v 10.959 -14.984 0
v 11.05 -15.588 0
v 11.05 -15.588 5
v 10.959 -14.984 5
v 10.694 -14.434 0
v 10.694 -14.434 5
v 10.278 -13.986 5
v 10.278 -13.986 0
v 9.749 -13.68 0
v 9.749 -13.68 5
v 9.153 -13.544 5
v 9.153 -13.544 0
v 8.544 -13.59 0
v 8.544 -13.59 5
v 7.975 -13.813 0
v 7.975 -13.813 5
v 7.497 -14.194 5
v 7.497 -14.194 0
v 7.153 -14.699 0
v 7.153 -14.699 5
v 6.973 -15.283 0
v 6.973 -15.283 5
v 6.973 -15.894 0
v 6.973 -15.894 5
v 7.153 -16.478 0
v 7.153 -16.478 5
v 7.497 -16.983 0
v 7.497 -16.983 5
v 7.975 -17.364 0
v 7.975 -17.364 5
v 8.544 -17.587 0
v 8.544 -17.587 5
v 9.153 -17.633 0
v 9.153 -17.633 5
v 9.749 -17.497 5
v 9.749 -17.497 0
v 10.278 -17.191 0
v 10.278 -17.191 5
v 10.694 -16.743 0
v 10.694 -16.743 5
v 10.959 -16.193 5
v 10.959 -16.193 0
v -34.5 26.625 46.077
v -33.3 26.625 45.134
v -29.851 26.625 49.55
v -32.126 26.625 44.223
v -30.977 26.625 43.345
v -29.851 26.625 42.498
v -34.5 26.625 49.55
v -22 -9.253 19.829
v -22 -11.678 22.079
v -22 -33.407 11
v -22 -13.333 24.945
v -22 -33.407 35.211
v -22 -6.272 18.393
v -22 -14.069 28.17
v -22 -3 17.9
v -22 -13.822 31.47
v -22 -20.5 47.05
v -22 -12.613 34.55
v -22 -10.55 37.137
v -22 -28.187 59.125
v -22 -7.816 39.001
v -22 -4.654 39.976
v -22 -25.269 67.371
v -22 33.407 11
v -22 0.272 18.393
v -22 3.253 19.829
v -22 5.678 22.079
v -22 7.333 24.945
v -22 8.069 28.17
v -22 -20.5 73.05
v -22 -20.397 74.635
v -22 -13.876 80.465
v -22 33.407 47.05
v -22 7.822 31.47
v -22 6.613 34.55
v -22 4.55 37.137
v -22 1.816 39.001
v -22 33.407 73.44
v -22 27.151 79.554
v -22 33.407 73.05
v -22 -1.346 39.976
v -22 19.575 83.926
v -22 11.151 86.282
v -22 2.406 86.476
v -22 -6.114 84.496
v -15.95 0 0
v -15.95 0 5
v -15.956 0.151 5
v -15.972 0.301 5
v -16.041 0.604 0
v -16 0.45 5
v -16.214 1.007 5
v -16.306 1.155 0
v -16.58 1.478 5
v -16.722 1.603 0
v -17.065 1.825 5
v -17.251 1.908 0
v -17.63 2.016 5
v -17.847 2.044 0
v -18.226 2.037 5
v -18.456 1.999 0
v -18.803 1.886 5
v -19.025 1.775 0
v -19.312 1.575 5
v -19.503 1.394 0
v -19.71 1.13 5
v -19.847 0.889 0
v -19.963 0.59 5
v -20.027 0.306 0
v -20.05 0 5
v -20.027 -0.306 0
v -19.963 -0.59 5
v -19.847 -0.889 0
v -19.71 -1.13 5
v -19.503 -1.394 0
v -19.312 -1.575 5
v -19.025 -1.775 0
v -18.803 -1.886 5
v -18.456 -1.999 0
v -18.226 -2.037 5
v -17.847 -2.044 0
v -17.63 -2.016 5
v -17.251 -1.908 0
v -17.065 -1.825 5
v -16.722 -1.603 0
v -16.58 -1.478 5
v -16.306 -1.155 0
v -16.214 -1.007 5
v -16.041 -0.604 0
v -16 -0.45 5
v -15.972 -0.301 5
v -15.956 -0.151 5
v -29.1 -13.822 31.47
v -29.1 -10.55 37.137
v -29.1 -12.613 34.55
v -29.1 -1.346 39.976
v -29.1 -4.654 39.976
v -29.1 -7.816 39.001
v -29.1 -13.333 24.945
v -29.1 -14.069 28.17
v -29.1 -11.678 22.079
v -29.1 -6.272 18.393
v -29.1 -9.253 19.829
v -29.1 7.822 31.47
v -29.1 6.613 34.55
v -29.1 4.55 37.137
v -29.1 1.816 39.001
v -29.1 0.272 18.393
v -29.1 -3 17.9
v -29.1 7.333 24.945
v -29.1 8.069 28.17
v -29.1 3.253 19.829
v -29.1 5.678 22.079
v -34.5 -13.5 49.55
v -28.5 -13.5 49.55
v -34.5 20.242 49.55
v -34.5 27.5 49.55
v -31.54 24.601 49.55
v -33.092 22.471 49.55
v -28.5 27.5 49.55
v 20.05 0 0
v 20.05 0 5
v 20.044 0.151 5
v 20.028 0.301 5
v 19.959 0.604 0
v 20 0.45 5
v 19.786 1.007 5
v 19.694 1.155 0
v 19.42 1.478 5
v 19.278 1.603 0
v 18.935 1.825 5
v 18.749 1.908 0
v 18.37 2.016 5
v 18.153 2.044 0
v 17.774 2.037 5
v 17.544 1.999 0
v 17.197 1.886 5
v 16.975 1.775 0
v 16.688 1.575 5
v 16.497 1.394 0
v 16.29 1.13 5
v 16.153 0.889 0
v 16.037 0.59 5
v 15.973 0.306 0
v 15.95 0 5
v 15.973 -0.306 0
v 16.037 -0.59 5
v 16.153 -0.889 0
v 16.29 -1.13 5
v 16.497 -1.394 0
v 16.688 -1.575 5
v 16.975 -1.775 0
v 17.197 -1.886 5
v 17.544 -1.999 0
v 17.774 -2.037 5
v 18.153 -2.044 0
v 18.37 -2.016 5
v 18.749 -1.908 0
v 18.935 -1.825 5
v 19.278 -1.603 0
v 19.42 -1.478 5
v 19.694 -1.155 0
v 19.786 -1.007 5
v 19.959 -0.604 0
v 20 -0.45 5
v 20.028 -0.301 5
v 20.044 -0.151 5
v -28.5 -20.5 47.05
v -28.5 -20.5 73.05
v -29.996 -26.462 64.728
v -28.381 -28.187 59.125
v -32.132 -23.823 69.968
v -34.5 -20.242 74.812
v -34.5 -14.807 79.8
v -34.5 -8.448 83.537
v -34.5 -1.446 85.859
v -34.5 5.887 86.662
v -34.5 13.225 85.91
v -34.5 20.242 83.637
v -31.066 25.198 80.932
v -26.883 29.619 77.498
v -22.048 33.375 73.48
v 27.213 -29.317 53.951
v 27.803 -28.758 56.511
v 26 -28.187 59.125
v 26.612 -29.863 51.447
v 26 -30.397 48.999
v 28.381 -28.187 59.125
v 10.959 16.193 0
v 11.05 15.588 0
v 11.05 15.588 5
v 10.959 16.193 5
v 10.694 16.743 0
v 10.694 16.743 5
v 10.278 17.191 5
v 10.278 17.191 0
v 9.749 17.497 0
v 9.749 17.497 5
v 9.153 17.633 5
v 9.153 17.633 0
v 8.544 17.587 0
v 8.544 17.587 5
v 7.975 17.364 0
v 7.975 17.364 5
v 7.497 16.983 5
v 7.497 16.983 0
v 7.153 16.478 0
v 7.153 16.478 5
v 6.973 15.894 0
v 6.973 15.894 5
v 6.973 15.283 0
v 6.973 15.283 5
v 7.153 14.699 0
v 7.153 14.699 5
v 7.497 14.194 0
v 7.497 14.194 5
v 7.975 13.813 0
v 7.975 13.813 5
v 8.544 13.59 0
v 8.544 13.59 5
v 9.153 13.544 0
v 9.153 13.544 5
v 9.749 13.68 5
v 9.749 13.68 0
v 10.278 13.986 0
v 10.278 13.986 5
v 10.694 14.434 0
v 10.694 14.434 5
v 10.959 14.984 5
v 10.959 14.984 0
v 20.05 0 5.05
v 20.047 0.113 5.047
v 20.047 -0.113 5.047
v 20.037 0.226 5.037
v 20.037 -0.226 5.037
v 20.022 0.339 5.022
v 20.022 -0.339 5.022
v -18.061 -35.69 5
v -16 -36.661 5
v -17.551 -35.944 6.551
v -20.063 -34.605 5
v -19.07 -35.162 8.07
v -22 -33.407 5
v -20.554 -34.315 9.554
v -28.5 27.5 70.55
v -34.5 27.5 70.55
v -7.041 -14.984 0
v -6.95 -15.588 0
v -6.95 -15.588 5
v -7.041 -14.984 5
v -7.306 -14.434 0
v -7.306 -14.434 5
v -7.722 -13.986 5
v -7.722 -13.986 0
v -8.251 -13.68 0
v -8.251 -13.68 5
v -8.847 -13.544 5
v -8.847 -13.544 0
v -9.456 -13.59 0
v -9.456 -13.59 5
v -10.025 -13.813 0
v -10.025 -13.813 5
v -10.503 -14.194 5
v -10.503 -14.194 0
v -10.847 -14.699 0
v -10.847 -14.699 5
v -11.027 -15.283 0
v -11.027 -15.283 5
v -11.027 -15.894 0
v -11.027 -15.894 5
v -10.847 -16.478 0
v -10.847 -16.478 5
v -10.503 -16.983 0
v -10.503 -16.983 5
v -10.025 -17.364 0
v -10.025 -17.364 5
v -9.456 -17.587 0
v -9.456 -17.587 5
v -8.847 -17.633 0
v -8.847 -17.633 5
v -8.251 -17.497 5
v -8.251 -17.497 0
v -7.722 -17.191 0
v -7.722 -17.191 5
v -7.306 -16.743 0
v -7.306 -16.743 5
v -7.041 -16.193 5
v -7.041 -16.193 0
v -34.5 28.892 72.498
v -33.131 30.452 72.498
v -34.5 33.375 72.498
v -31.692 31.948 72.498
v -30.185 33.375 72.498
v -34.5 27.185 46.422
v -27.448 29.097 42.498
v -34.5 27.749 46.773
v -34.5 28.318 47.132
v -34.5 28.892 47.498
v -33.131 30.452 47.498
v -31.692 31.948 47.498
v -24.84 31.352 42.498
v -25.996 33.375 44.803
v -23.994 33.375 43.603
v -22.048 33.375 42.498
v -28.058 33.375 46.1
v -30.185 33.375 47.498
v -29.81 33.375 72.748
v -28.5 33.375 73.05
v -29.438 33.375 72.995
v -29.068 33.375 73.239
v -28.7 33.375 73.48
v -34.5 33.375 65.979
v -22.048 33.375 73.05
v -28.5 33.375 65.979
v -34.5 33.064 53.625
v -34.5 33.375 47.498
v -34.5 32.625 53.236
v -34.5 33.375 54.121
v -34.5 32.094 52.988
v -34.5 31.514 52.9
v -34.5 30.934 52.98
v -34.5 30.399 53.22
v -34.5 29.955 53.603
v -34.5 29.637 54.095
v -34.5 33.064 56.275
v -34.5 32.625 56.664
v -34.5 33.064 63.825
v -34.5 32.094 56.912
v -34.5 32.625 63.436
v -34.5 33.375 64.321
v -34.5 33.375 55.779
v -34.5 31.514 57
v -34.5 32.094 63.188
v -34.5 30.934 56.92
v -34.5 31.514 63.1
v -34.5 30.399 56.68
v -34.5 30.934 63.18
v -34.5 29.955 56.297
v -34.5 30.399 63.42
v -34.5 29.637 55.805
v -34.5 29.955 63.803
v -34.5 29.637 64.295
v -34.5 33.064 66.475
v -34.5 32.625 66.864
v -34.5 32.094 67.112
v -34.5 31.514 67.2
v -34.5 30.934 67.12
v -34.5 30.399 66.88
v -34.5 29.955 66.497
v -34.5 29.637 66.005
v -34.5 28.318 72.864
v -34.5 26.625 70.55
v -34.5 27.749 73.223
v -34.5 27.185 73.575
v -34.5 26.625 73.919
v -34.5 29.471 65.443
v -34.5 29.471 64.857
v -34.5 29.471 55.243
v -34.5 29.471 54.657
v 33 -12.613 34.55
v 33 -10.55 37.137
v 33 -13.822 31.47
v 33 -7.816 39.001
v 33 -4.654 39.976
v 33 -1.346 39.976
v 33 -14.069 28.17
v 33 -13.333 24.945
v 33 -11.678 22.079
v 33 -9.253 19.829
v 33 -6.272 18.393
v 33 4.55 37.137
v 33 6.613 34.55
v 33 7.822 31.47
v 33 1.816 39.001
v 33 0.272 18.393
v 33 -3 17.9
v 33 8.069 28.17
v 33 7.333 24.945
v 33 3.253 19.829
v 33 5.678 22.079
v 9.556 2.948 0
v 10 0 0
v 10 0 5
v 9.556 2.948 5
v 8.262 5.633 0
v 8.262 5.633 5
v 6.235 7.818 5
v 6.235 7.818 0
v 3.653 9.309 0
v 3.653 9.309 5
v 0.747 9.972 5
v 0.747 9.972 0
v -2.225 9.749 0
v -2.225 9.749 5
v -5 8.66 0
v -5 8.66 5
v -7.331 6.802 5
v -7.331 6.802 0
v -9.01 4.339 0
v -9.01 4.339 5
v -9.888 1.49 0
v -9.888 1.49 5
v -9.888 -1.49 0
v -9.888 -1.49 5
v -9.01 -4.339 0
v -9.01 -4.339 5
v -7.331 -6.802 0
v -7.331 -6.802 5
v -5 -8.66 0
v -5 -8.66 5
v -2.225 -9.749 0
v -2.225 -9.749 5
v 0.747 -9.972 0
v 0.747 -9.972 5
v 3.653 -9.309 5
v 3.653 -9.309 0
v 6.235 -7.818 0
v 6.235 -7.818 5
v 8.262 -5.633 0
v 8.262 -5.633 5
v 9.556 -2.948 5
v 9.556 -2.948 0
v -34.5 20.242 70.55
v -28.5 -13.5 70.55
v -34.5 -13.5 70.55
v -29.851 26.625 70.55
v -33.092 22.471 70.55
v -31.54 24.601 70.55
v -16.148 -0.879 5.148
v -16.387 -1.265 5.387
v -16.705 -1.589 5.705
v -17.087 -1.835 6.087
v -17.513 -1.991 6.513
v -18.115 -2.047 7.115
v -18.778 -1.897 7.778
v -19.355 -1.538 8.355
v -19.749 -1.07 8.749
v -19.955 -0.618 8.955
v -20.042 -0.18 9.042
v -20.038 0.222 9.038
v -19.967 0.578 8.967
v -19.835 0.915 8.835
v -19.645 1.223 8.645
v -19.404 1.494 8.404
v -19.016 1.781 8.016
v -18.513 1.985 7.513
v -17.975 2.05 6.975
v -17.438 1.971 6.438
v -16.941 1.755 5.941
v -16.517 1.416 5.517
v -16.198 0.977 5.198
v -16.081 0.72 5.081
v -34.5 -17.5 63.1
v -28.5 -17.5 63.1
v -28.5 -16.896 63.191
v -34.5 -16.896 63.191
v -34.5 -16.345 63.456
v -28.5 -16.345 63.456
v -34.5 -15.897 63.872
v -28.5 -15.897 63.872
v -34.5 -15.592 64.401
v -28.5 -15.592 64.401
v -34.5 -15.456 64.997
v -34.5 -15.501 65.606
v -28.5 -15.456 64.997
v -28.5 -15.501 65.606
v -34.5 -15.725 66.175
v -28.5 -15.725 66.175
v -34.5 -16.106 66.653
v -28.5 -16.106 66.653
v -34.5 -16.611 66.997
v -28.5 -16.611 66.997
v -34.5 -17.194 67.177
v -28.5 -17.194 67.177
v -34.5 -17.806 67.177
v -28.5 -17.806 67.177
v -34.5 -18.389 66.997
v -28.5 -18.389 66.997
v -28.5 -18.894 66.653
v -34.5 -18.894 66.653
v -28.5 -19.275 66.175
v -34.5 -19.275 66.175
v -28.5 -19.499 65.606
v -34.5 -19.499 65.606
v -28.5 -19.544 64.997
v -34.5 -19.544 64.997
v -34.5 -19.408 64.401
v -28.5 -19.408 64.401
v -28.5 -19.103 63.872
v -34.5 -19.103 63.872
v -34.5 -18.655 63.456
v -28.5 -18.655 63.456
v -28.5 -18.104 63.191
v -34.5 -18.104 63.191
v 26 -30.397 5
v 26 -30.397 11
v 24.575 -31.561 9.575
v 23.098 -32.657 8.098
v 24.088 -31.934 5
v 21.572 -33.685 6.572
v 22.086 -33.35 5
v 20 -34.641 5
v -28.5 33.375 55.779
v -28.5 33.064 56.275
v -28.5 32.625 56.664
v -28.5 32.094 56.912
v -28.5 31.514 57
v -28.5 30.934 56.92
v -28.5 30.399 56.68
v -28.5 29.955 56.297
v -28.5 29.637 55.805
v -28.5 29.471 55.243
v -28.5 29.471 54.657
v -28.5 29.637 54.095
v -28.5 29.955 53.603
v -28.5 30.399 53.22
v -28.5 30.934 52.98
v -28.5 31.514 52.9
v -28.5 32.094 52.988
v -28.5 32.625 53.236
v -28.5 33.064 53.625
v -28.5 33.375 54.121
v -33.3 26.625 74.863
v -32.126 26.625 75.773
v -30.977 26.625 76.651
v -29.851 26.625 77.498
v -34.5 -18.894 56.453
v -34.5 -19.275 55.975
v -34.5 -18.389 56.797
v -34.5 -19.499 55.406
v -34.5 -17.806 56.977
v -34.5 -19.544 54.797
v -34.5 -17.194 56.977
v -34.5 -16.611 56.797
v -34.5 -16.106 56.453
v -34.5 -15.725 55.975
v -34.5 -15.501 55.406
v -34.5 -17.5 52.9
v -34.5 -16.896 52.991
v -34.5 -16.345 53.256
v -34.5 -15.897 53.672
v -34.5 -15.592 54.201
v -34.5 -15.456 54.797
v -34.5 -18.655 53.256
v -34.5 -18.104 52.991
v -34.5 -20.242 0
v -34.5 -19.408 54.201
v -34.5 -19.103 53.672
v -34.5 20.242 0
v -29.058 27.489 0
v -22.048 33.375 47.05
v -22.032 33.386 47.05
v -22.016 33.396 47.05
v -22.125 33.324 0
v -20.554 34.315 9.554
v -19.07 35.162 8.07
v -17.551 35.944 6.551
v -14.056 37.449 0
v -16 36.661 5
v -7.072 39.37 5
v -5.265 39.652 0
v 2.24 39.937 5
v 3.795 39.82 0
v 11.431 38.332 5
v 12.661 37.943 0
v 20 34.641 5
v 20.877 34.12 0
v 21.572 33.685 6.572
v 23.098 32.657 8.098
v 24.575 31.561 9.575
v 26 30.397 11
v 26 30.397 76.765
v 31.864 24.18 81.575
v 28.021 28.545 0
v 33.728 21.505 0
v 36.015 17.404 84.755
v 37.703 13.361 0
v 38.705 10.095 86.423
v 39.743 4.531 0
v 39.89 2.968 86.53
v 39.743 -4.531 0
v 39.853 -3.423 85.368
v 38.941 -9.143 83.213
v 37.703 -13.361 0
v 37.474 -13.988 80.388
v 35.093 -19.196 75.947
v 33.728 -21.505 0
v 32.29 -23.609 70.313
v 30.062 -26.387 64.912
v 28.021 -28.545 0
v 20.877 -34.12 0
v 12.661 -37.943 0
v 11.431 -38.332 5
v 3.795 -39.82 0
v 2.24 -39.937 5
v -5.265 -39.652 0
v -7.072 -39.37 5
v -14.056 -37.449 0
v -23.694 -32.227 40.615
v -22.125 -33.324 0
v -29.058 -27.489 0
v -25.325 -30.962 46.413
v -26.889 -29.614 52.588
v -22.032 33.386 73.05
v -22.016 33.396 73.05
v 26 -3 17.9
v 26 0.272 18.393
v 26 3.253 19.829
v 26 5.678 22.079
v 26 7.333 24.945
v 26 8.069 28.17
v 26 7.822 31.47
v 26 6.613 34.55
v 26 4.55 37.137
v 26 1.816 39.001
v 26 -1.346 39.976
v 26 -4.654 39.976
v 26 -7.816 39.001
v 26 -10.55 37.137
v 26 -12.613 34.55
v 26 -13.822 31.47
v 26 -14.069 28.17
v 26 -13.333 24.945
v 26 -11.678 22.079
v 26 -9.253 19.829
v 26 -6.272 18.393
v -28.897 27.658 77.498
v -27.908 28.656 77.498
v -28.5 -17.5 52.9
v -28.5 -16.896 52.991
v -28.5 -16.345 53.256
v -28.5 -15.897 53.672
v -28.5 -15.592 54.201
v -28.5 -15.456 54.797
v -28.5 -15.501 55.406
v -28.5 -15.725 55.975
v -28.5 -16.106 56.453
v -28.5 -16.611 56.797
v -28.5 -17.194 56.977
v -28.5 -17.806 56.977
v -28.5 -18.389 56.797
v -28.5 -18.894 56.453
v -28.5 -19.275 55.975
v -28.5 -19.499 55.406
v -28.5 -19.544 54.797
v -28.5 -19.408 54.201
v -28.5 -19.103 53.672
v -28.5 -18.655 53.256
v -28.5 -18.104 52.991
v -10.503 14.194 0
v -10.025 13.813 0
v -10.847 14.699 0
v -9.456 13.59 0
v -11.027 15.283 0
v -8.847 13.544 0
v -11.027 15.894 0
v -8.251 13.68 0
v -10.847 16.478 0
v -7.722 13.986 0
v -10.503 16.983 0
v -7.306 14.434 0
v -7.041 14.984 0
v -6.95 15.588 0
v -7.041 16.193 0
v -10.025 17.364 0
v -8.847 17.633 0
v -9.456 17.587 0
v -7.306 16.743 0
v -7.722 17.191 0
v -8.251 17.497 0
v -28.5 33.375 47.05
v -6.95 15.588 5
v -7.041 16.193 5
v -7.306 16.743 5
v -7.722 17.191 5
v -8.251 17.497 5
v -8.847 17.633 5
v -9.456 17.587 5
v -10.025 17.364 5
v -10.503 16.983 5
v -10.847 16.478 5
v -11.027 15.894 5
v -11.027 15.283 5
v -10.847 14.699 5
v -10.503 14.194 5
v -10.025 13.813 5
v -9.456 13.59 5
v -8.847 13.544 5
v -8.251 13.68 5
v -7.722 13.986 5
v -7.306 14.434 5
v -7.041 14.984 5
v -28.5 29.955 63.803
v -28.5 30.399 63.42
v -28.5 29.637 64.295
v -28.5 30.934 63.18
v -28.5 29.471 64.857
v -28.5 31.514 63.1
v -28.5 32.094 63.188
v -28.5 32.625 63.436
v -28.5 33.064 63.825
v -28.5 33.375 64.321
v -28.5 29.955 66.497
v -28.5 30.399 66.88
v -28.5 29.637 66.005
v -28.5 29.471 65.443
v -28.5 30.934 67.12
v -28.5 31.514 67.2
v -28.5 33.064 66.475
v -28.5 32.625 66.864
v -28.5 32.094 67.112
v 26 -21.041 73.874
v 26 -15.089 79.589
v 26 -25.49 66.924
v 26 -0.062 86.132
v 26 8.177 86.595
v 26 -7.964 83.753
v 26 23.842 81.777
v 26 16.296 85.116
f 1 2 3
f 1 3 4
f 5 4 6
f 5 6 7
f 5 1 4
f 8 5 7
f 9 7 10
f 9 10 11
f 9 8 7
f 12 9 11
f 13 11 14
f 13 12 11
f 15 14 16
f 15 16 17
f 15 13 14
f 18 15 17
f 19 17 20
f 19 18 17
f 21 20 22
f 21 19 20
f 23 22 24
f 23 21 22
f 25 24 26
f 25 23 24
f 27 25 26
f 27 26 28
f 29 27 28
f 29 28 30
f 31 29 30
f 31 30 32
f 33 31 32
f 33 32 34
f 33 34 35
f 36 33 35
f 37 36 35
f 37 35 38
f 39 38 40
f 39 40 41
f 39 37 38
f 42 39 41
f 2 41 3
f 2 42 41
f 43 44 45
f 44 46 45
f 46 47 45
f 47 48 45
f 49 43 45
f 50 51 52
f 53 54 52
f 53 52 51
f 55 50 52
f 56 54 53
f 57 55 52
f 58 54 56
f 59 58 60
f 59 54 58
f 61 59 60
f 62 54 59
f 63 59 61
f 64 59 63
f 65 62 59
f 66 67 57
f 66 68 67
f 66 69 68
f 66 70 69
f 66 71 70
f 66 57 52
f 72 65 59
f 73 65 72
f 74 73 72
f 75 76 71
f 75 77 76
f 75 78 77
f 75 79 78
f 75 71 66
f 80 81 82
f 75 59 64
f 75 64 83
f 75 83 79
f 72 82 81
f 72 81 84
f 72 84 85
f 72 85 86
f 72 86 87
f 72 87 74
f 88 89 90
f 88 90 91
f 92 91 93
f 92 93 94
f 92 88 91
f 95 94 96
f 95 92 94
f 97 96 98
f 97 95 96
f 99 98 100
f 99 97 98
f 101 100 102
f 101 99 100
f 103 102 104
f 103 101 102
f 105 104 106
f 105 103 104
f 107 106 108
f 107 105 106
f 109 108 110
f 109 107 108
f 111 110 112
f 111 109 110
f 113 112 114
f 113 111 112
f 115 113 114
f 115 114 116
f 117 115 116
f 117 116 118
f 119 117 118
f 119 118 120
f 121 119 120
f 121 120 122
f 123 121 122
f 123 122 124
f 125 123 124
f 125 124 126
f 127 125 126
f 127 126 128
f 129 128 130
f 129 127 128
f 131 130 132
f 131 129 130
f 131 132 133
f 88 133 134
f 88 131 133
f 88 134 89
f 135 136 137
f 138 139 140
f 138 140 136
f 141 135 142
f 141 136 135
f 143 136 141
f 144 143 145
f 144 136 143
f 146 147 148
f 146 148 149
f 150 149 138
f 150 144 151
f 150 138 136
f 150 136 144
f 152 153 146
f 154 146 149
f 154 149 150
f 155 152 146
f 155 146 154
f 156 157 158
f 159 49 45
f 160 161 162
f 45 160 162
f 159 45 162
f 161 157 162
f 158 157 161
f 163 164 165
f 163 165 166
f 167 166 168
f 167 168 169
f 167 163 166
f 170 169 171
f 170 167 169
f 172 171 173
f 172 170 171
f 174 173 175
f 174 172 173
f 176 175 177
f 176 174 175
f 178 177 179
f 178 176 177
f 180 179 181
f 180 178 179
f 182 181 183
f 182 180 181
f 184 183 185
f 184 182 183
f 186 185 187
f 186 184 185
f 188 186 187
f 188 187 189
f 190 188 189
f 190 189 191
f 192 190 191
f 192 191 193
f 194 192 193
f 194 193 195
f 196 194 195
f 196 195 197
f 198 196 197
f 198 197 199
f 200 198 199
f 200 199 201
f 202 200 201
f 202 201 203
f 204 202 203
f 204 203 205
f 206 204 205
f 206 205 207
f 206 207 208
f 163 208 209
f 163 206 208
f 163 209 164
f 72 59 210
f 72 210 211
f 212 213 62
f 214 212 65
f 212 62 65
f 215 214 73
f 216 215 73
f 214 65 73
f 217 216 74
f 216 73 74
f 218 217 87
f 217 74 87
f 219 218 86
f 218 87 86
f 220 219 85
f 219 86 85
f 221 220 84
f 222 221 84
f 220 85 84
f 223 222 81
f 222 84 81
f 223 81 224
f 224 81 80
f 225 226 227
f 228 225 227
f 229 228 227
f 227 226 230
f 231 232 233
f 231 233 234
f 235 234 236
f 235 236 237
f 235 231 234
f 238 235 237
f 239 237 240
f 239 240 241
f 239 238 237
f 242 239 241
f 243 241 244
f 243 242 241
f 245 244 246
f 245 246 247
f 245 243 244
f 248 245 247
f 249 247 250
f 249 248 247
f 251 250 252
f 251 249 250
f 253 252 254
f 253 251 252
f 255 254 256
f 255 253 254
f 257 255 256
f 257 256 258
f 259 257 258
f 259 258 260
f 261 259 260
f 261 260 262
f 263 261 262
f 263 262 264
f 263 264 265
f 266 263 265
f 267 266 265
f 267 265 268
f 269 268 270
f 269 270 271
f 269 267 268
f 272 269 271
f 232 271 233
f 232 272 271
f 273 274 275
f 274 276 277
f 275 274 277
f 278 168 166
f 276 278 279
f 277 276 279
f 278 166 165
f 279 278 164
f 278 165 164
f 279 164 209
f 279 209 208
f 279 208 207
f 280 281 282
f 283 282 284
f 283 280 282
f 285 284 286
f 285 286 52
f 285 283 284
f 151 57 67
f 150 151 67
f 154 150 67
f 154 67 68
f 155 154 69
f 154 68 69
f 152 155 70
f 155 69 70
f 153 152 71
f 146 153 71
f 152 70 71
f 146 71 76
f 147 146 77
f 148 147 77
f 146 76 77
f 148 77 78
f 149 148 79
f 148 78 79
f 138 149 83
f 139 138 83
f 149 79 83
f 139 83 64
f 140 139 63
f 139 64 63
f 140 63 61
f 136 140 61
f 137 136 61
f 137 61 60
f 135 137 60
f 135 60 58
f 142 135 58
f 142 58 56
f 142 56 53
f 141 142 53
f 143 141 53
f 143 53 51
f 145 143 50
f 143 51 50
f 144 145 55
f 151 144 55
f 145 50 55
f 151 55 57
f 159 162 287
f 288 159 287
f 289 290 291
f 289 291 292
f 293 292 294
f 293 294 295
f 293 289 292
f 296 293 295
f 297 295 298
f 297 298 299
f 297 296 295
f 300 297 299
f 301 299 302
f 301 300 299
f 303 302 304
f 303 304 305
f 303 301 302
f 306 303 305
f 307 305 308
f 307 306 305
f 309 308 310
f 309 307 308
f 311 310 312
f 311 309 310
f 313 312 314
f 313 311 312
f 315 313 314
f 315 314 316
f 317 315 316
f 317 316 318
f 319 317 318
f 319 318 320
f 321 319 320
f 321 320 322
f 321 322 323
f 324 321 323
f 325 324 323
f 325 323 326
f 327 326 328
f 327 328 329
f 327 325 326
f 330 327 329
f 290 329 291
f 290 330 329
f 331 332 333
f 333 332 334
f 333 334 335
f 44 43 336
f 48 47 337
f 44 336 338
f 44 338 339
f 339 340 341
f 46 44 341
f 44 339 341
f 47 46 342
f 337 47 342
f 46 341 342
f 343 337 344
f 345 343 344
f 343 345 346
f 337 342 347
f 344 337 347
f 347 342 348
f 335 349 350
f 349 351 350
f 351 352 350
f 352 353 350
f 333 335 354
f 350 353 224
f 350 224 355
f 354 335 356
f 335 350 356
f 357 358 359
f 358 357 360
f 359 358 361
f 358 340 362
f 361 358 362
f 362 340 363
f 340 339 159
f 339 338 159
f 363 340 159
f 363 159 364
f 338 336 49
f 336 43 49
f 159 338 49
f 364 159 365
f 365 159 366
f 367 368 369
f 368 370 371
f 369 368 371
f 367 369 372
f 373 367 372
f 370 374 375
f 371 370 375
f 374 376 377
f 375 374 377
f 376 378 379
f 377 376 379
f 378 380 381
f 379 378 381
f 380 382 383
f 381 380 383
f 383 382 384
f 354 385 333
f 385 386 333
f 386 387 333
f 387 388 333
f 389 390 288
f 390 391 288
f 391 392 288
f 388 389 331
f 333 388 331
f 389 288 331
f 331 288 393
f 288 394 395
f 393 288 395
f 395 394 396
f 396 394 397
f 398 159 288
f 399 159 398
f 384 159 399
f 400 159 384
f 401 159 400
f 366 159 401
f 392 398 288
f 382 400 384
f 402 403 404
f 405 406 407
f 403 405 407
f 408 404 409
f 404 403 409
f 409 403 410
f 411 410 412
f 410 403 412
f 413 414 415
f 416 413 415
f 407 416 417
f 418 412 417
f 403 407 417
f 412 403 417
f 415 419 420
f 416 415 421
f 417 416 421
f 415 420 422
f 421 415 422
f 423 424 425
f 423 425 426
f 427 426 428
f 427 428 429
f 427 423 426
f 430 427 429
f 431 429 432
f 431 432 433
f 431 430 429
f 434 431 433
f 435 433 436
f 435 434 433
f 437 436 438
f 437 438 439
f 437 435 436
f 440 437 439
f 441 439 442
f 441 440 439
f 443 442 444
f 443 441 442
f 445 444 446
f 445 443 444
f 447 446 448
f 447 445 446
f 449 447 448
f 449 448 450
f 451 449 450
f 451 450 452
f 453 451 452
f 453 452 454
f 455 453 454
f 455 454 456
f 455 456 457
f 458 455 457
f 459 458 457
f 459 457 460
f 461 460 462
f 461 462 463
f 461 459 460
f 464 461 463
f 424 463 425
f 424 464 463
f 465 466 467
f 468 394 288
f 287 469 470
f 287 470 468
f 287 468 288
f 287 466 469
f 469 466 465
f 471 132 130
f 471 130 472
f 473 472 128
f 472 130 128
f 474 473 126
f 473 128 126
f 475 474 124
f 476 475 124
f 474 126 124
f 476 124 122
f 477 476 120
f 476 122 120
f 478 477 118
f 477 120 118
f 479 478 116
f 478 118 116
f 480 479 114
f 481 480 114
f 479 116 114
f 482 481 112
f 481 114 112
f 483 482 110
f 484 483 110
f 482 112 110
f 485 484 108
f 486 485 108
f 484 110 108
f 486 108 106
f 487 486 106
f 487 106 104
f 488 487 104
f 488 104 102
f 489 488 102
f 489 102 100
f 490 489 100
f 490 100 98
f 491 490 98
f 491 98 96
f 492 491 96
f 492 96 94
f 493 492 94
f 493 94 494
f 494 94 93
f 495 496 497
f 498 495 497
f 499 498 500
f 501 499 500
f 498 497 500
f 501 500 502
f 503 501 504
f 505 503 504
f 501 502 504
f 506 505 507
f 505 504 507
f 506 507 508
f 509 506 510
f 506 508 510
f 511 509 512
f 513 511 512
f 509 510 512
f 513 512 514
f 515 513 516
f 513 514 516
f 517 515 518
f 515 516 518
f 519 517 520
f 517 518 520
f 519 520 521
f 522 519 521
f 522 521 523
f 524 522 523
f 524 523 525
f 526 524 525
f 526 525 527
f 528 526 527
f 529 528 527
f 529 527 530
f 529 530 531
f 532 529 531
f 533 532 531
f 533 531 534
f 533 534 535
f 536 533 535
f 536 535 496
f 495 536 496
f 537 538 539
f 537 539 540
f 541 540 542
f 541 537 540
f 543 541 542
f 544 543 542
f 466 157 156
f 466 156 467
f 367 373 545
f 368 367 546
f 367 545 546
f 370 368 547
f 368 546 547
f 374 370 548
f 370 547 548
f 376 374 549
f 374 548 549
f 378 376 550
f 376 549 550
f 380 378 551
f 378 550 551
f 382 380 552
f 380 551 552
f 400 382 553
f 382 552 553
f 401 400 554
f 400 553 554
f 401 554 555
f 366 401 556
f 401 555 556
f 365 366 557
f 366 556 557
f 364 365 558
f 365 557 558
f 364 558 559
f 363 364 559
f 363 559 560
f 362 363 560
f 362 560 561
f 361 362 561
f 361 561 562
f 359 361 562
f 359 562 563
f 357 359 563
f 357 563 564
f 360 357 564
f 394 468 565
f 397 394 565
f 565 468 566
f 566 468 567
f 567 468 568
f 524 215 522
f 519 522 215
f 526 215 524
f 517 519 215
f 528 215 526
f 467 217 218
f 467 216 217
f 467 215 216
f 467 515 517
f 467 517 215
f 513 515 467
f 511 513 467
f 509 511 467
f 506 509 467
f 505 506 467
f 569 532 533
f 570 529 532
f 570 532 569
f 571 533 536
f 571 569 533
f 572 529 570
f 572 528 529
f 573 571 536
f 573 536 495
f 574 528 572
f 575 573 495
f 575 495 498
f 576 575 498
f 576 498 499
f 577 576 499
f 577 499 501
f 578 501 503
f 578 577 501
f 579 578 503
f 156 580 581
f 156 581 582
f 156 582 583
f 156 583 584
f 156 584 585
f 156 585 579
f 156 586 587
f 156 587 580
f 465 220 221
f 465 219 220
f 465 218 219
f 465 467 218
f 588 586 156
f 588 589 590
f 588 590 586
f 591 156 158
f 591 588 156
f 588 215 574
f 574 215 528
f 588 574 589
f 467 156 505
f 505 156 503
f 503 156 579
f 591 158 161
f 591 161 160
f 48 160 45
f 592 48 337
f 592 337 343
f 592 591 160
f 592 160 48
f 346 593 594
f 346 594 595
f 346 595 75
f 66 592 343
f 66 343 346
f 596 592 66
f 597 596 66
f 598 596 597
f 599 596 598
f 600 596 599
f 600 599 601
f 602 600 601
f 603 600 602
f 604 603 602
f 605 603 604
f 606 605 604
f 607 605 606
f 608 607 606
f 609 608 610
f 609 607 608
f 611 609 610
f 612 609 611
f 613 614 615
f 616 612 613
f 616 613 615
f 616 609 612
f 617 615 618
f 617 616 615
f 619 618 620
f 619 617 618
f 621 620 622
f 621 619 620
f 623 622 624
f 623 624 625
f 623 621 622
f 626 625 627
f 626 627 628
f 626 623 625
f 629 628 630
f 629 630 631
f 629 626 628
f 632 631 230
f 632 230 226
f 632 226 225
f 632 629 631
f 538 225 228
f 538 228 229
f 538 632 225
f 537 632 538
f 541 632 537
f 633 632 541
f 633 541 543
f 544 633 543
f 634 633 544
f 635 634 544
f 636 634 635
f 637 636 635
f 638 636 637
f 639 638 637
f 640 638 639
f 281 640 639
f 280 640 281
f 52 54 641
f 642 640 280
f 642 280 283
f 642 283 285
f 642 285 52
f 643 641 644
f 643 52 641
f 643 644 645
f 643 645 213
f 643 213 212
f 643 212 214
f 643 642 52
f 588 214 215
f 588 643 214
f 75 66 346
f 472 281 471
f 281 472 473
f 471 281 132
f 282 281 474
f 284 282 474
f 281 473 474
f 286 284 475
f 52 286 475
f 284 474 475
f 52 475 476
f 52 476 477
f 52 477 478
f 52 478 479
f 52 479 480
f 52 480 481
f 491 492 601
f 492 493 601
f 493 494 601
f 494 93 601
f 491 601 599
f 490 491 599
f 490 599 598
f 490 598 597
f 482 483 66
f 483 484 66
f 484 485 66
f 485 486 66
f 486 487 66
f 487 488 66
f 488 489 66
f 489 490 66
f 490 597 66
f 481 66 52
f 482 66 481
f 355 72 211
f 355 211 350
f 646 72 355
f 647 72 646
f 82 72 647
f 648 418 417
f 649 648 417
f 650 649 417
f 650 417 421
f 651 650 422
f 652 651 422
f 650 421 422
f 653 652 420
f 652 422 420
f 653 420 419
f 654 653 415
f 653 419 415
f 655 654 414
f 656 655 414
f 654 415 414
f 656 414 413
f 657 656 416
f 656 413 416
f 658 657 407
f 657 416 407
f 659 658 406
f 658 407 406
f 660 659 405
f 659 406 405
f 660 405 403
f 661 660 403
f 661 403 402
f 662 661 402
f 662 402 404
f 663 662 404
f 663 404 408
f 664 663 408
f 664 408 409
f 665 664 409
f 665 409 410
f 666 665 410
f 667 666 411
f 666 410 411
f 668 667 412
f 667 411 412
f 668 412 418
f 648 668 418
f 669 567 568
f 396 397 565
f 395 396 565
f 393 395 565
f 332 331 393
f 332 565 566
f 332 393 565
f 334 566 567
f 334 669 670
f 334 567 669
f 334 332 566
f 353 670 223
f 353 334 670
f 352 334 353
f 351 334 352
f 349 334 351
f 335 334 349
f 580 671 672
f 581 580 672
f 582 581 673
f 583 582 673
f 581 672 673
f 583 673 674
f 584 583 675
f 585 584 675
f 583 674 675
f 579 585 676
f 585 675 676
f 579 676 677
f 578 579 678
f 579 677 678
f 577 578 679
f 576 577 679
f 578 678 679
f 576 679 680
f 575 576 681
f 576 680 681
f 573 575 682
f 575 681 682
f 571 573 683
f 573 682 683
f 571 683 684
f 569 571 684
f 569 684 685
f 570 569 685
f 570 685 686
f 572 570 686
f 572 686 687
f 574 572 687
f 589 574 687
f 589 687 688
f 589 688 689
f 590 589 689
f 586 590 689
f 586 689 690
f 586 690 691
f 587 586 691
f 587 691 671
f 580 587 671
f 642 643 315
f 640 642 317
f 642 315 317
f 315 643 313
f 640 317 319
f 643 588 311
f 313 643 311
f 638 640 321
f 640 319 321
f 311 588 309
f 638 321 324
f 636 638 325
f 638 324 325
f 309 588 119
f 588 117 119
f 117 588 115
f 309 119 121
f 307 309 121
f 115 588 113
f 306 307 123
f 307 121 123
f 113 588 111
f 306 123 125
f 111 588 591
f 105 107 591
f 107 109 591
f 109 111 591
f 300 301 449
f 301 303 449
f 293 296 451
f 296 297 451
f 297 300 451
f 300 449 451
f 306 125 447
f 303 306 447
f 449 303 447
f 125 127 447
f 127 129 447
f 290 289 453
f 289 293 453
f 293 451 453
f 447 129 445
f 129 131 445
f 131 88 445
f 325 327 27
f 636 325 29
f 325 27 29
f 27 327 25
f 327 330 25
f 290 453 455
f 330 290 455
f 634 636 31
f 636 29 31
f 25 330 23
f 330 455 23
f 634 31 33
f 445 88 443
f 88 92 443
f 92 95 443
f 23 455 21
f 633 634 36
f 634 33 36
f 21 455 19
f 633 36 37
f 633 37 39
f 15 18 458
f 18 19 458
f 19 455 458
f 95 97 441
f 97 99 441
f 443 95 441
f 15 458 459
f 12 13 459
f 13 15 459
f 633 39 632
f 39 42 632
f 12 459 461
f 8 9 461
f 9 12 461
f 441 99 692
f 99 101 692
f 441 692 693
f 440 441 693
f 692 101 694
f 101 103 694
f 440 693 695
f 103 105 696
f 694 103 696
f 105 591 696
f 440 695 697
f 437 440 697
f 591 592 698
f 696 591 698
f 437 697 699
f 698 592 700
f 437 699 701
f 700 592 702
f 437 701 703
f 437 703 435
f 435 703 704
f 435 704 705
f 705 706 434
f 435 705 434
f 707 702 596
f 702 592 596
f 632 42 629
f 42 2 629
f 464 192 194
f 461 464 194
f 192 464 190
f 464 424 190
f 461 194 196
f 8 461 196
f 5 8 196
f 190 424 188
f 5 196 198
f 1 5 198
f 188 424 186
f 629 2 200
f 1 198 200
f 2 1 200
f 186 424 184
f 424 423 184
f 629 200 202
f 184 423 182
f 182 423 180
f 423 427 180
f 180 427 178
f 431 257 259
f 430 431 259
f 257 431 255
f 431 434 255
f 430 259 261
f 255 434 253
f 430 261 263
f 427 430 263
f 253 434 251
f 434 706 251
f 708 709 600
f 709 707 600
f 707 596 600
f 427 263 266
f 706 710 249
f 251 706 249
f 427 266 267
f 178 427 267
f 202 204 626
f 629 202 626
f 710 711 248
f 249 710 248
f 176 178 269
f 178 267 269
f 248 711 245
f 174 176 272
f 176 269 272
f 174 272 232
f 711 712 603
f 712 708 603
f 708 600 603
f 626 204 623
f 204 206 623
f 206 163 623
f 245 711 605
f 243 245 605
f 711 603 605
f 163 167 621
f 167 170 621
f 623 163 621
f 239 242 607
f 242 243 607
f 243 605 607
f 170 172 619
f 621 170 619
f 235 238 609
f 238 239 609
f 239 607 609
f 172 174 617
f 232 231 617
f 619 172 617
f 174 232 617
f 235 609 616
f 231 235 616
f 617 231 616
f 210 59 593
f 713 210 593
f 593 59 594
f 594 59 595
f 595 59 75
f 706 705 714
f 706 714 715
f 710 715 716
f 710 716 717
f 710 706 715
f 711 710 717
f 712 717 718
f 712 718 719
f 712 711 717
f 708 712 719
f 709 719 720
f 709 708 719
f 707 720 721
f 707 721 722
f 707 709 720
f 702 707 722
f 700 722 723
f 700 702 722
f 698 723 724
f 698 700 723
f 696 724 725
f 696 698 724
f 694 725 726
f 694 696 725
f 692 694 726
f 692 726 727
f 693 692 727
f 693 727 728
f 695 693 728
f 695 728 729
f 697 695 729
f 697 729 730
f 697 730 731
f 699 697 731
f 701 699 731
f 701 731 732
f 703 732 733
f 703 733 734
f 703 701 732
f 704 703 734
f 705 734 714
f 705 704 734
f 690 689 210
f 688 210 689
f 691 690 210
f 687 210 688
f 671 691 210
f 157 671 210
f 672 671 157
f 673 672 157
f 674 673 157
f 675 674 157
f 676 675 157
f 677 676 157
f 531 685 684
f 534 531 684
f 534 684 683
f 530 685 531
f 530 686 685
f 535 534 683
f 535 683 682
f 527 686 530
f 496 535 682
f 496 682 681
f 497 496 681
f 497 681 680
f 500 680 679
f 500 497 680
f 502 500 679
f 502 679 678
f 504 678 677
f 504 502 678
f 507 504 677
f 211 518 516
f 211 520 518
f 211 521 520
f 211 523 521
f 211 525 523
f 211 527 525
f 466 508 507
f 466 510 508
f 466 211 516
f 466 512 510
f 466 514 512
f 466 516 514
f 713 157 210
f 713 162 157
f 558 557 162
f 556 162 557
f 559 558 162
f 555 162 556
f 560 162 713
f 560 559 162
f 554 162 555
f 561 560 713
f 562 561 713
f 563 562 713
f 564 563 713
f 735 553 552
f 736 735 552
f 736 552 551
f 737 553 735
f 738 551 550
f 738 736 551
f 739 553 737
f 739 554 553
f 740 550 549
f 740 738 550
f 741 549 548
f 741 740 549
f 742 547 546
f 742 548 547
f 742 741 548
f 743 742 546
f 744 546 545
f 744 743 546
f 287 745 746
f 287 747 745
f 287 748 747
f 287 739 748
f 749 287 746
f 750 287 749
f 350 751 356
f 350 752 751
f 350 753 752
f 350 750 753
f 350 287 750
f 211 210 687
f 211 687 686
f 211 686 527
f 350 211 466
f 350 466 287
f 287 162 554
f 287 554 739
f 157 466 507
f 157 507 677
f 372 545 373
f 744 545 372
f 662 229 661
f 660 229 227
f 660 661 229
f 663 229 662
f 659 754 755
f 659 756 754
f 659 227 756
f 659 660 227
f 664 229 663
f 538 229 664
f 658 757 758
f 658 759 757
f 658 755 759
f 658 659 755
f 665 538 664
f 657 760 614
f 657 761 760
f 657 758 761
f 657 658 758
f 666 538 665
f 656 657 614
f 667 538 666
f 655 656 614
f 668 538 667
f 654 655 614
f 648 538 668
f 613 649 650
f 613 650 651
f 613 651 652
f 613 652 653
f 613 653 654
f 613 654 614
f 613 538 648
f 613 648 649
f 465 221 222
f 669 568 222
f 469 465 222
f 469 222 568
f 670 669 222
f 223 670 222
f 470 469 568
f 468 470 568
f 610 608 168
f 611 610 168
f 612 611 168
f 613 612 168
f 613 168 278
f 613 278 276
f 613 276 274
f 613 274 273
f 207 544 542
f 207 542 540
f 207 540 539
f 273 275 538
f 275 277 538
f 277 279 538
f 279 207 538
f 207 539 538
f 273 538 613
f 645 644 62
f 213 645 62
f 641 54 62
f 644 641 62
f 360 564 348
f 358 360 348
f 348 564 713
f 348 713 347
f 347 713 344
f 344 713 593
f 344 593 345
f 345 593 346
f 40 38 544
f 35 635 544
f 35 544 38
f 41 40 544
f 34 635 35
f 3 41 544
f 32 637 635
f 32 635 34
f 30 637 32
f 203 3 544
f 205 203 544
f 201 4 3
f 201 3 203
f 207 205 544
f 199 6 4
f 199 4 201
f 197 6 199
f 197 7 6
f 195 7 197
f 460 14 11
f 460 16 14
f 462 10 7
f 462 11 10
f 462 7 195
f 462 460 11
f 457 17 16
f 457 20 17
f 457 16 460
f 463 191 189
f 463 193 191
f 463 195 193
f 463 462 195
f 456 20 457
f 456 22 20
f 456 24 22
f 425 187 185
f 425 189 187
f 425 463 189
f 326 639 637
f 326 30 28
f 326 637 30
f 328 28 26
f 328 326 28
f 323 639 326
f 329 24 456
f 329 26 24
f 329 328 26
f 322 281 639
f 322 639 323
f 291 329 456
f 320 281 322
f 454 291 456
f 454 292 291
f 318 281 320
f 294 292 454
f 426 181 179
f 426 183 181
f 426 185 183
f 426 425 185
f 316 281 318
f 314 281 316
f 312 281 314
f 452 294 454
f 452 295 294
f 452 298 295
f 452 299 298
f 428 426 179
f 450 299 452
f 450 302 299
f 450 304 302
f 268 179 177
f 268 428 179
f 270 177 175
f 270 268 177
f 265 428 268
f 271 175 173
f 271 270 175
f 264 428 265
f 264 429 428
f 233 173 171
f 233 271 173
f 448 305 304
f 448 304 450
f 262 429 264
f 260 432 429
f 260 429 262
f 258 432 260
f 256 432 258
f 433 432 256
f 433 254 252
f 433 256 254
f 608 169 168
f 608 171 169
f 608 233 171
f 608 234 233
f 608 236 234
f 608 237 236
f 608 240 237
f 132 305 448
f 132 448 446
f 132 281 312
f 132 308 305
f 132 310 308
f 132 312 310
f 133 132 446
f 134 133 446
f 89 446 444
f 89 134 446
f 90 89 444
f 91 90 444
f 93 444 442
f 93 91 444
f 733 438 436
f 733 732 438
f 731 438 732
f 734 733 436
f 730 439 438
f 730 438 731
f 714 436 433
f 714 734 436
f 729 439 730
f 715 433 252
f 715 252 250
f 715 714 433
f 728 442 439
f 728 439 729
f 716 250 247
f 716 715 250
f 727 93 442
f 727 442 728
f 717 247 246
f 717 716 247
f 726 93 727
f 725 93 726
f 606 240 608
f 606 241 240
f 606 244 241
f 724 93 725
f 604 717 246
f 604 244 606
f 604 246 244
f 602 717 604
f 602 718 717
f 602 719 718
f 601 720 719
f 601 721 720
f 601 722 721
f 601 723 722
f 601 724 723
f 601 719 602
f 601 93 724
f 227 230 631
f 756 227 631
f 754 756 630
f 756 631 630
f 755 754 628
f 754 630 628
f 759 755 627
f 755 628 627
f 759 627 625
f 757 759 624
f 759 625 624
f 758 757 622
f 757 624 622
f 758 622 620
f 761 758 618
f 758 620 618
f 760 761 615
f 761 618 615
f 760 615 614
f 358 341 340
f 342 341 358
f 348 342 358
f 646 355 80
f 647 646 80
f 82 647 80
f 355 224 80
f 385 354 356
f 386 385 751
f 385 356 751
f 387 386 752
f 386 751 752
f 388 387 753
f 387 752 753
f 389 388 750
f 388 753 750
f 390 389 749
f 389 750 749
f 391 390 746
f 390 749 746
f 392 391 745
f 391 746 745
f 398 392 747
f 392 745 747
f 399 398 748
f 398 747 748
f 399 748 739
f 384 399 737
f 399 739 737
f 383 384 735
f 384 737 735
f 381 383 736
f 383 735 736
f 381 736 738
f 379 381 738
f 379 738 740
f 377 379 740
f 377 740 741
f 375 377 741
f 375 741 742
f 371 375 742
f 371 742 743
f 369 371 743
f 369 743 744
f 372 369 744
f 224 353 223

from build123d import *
from build123d.topology import SkipClean

# Parameters (mm, degrees)
SKETCH3_R           = 40
SKETCH3_R_2         = 2.05
SKETCH3_R_3         = 10
BOSS_EXTRUDE1_DEPTH = 5
BOSS_EXTRUDE2_DEPTH = 41
SKETCH5_W           = 112.43258682
SKETCH5_H           = 89.925085182
CUT_EXTRUDE1_DEPTH  = 100
CUT_EXTRUDE2_START  = 5
CUT_EXTRUDE2_DEPTH  = 82
CUT_EXTRUDE3_START  = -22
SKETCH7_R           = 11.1
CUT_EXTRUDE3_DEPTH  = 7.1
BOSS_EXTRUDE3_START = -22
SKETCH9_W           = 6.75
SKETCH9_H           = 25
BOSS_EXTRUDE3_DEPTH = 12.5
SKETCH8_R           = 2.05
SKETCH8_W           = 41
SKETCH8_H           = 21
CUT_EXTRUDE5_DEPTH  = 50
CHAMFER1_SIZE       = 5
CHAMFER2_SIZE       = 6
CUT_EXTRUDE6_START  = 33
SKETCH10_R          = 11.1
CUT_EXTRUDE6_DEPTH  = 7
CUT_EXTRUDE7_START  = -22
SKETCH11_W          = 55
SKETCH11_H          = 26
CUT_EXTRUDE7_DEPTH  = 6.5


with BuildPart() as part:
    # Sketch3 → Boss-Extrude1 (new body)
    with BuildSketch(Plane(origin=(0, 0, 0), x_dir=(0, 1, 0), z_dir=(0, 0, 1))):
        with Locations(Location((0, 0, 0), (0, 0, 270))):
            Circle(SKETCH3_R)
        with Locations(Location((0, 18, 0), (0, 0, 270))):
            Circle(SKETCH3_R_2, mode=Mode.SUBTRACT)
        with Locations(Location((15.588457268, 9, 0), (0, 0, 270))):
            Circle(SKETCH3_R_2, mode=Mode.SUBTRACT)
        with Locations(Location((15.588457268, -9, 0), (0, 0, 270))):
            Circle(SKETCH3_R_2, mode=Mode.SUBTRACT)
        with Locations(Location((0, -18, 0), (0, 0, 270))):
            Circle(SKETCH3_R_2, mode=Mode.SUBTRACT)
        with Locations(Location((-15.588457268, -9, 0), (0, 0, 270))):
            Circle(SKETCH3_R_2, mode=Mode.SUBTRACT)
        with Locations(Location((-15.588457268, 9, 0), (0, 0, 270))):
            Circle(SKETCH3_R_2, mode=Mode.SUBTRACT)
        with Locations(Location((0, 0, 0), (0, 0, 270))):
            Circle(SKETCH3_R_3, mode=Mode.SUBTRACT)
    extrude(amount=BOSS_EXTRUDE1_DEPTH)

    # Sketch4 → Boss-Extrude2 (add, symmetric)
    with BuildSketch(Plane.YZ):
        with BuildLine():
            Line((-40, 5), (-28.187426516, 59.125004254))
            ThreePointArc((-28.187426516, 59.125004254), (5.55857639, 86.659175658), (40, 60))
            Line((40, 60), (40, 5))
            Line((40, 5), (-40, 5))
        make_face()
    extrude(amount=BOSS_EXTRUDE2_DEPTH, both=True)

    # Sketch5 → Cut-Extrude1 (cut)
    with SkipClean():  # the faces are left unmerged after this step: merging them gives an invalid solid
        with BuildSketch(Plane(origin=(0, 0, 0), x_dir=(0, 1, 0), z_dir=(0, 0, 1))):
            Rectangle(SKETCH5_W, SKETCH5_H)
            with BuildLine():
                Line((-20.24228248, 34.5), (20.24228248, 34.5))
                ThreePointArc((20.24228248, 34.5), (0, -40), (-20.24228248, 34.5))
            make_face(mode=Mode.SUBTRACT)
        extrude(amount=CUT_EXTRUDE1_DEPTH, mode=Mode.SUBTRACT)
    add(part.part.scale(1), mode=Mode.REPLACE)  # the faces are merged on a copy

    # Sketch6 → Cut-Extrude2 (cut)
    with BuildSketch(Plane(origin=(0, 0, 0), x_dir=(0, 1, 0), z_dir=(0, 0, 1)).offset(CUT_EXTRUDE2_START)):
        with BuildLine():
            Line((-13.85765721, -26), (13.85765721, -26))
            Line((13.85765721, -26), (30.397368307, -26))
            ThreePointArc((30.397368307, -26), (39.921625117, -2.502768077), (33.406586177, 22))
            Line((33.406586177, 22), (-33.406586177, 22))
            ThreePointArc((-33.406586177, 22), (-39.921625117, -2.502768077), (-30.397368307, -26))
            Line((-30.397368307, -26), (-13.85765721, -26))
        make_face()
        with BuildLine():
            Line((-20.24228248, 34.5), (20.24228248, 34.5))
            ThreePointArc((20.24228248, 34.5), (0, 40), (-20.24228248, 34.5))
        make_face()
    extrude(amount=CUT_EXTRUDE2_DEPTH, mode=Mode.SUBTRACT)

    # Sketch7 → Cut-Extrude3 (cut)
    with BuildSketch(Plane.YZ.offset(CUT_EXTRUDE3_START)):
        with Locations(Location((-3, 29, 0), (0, 0, 270))):
            Circle(SKETCH7_R)
    extrude(amount=-CUT_EXTRUDE3_DEPTH, mode=Mode.SUBTRACT)

    # Sketch9 → Boss-Extrude3 (add)
    with BuildSketch(Plane.YZ.offset(BOSS_EXTRUDE3_START)):
        with Locations((30, 59.998090913)):
            Rectangle(SKETCH9_W, SKETCH9_H)
    extrude(amount=-BOSS_EXTRUDE3_DEPTH)

    # Sketch8 → Cut-Extrude5 (cut)
    with BuildSketch(Plane.YZ):
        with Locations(Location((-17.5, 65.15, 0), (0, 0, 270))):
            Circle(SKETCH8_R)
        with Locations(Location((-17.5, 54.95, 0), (0, 0, 270))):
            Circle(SKETCH8_R)
        with Locations((31.5, 54.95)):
            Circle(SKETCH8_R)
        with Locations((31.5, 65.15)):
            Circle(SKETCH8_R)
        with Locations((7, 60.05)):
            Rectangle(SKETCH8_W, SKETCH8_H)
    extrude(amount=-CUT_EXTRUDE5_DEPTH, mode=Mode.SUBTRACT)

    # Chamfer1
    # the kernel refuses this chamfer: 5 mm, written as the material it adds along each edge
    with BuildSketch(Plane(origin=(0, 0, 72.498090913), x_dir=(-0.9183651186253444, 0.39573413915437844, 0), z_dir=(-0.39573413915437844, -0.9183651186253444, 0))) as chamfer1_piece_1_section:
        Polygon((40, -CHAMFER1_SIZE), (40 + CHAMFER1_SIZE, 0), (40, 0), align=None)
    chamfer1_piece_1 = revolve(axis=Axis((0, 0, 72.498090913), (0, 0, -1)), revolution_arc=51.657569858, mode=Mode.PRIVATE)
    chamfer1_piece_1 = split(chamfer1_piece_1, bisect_by=Plane(origin=(-34.5, 29.836622418, 73.971077773), z_dir=(1, 0, 0)), keep=Keep.TOP, mode=Mode.PRIVATE)
    chamfer1_piece_1 = split(chamfer1_piece_1, bisect_by=Plane(origin=(-22, 29.836622418, 73.971077773), z_dir=(-1, 0, 0)), keep=Keep.TOP, mode=Mode.PRIVATE)
    chamfer1_piece_1 = chamfer1_piece_1 & Plane(origin=(-28.977022362, 6.007666956, 51.662056953), x_dir=(0, -0.9770026706356161, 0.21322706575590716), z_dir=(1, 0, 0)) * Cylinder(35, 180, mode=Mode.PRIVATE)
    chamfer1_piece_1 = split(chamfer1_piece_1, bisect_by=Plane(origin=(-28.977022362, 33.375, 73.971077773), z_dir=(0, -1, 0)), keep=Keep.TOP, mode=Mode.PRIVATE)
    chamfer1_piece_1 = split(chamfer1_piece_1, bisect_by=Plane(origin=(-28.977022362, 26.625, 73.971077773), z_dir=(0, 1, 0)), keep=Keep.TOP, mode=Mode.PRIVATE)
    add(chamfer1_piece_1)
    with BuildSketch(Plane(origin=(0, 0, 47.498090913), x_dir=(-0.9183651186253442, 0.39573413915437894, 0), z_dir=(-0.39573413915437894, -0.9183651186253442, 0))) as chamfer1_piece_2_section:
        Polygon((40, CHAMFER1_SIZE), (40 + CHAMFER1_SIZE, 0), (40, 0), align=None)
    chamfer1_piece_2 = revolve(axis=Axis((0, 0, 47.498090913), (0, 0, -1)), revolution_arc=51.657569858, mode=Mode.PRIVATE)
    chamfer1_piece_2 = split(chamfer1_piece_2, bisect_by=Plane(origin=(-34.5, 30.172032739, 45.811526919), z_dir=(1, 0, 0)), keep=Keep.TOP, mode=Mode.PRIVATE)
    chamfer1_piece_2 = split(chamfer1_piece_2, bisect_by=Plane(origin=(-28.439026237, 26.625, 45.811526919), z_dir=(0, 1, 0)), keep=Keep.TOP, mode=Mode.PRIVATE)
    chamfer1_piece_2 = split(chamfer1_piece_2, bisect_by=Plane(origin=(-28.439026237, 33.375, 45.811526919), z_dir=(0, -1, 0)), keep=Keep.TOP, mode=Mode.PRIVATE)
    chamfer1_piece_2 = split(chamfer1_piece_2, bisect_by=Plane(origin=(-22, 30.172032739, 45.811526919), z_dir=(-1, 0, 0)), keep=Keep.TOP, mode=Mode.PRIVATE)
    add(chamfer1_piece_2)

    # Chamfer2
    # the kernel refuses this chamfer: 6 mm, written as the material it adds along each edge
    with BuildSketch(Plane(origin=(26, -45.827466235, 5), x_dir=(-0.9996219169112969, 0, -0.027495876610586355), z_dir=(0, 1, 0))) as chamfer2_piece_1_section:
        Polygon((CHAMFER2_SIZE * 0.999621916911, CHAMFER2_SIZE * 0.0274958766106), (-CHAMFER2_SIZE * 0.0274958766106, CHAMFER2_SIZE * 0.999621916911), (0, 0), align=None)
    chamfer2_piece_1 = extrude(amount=91.65493247, mode=Mode.PRIVATE)
    chamfer2_piece_1 = chamfer2_piece_1 & Plane(origin=(0, 0, 6.950735371), x_dir=(1, 0, 0), z_dir=(0, 0, -1)) * Cylinder(40, 208, mode=Mode.PRIVATE)
    chamfer2_piece_1 = chamfer2_piece_1 - Plane(origin=(18, 0, 6.950735371), x_dir=(1, 0, 0), z_dir=(0, 0, -1)) * Cylinder(2.05, 208, mode=Mode.PRIVATE)
    add(chamfer2_piece_1)
    with BuildSketch(Plane(origin=(-22, 48.836684105, 5), x_dir=(0.9996219169112969, 0, -0.027495876610586348), z_dir=(0, -1, 0))) as chamfer2_piece_2_section:
        Polygon((CHAMFER2_SIZE * 0.999621916911, CHAMFER2_SIZE * 0.0274958766106), (-CHAMFER2_SIZE * 0.0274958766106, CHAMFER2_SIZE * 0.999621916911), (0, 0), align=None)
    chamfer2_piece_2 = extrude(amount=97.67336821, mode=Mode.PRIVATE)
    chamfer2_piece_2 = chamfer2_piece_2 & Plane(origin=(0, 0, 5.808875482), x_dir=(1, 0, 0), z_dir=(0, 0, -1)) * Cylinder(40, 220, mode=Mode.PRIVATE)
    chamfer2_piece_2 = chamfer2_piece_2 - Plane(origin=(-18, 0, 5.808875482), x_dir=(1, 0, 0), z_dir=(0, 0, -1)) * Cylinder(2.05, 220, mode=Mode.PRIVATE)
    add(chamfer2_piece_2)

    # Sketch10 → Cut-Extrude6 (cut)
    with BuildSketch(Plane.YZ.offset(CUT_EXTRUDE6_START)):
        with Locations(Location((-3, 29, 0), (0, 0, 270))):
            Circle(SKETCH10_R)
    extrude(amount=-CUT_EXTRUDE6_DEPTH, mode=Mode.SUBTRACT)

    # Sketch11 → Cut-Extrude7 (cut)
    with BuildSketch(Plane.YZ.offset(CUT_EXTRUDE7_START)):
        with Locations((7, 60.05)):
            Rectangle(SKETCH11_W, SKETCH11_H)
    extrude(amount=-CUT_EXTRUDE7_DEPTH, mode=Mode.SUBTRACT)


solid = part.part
